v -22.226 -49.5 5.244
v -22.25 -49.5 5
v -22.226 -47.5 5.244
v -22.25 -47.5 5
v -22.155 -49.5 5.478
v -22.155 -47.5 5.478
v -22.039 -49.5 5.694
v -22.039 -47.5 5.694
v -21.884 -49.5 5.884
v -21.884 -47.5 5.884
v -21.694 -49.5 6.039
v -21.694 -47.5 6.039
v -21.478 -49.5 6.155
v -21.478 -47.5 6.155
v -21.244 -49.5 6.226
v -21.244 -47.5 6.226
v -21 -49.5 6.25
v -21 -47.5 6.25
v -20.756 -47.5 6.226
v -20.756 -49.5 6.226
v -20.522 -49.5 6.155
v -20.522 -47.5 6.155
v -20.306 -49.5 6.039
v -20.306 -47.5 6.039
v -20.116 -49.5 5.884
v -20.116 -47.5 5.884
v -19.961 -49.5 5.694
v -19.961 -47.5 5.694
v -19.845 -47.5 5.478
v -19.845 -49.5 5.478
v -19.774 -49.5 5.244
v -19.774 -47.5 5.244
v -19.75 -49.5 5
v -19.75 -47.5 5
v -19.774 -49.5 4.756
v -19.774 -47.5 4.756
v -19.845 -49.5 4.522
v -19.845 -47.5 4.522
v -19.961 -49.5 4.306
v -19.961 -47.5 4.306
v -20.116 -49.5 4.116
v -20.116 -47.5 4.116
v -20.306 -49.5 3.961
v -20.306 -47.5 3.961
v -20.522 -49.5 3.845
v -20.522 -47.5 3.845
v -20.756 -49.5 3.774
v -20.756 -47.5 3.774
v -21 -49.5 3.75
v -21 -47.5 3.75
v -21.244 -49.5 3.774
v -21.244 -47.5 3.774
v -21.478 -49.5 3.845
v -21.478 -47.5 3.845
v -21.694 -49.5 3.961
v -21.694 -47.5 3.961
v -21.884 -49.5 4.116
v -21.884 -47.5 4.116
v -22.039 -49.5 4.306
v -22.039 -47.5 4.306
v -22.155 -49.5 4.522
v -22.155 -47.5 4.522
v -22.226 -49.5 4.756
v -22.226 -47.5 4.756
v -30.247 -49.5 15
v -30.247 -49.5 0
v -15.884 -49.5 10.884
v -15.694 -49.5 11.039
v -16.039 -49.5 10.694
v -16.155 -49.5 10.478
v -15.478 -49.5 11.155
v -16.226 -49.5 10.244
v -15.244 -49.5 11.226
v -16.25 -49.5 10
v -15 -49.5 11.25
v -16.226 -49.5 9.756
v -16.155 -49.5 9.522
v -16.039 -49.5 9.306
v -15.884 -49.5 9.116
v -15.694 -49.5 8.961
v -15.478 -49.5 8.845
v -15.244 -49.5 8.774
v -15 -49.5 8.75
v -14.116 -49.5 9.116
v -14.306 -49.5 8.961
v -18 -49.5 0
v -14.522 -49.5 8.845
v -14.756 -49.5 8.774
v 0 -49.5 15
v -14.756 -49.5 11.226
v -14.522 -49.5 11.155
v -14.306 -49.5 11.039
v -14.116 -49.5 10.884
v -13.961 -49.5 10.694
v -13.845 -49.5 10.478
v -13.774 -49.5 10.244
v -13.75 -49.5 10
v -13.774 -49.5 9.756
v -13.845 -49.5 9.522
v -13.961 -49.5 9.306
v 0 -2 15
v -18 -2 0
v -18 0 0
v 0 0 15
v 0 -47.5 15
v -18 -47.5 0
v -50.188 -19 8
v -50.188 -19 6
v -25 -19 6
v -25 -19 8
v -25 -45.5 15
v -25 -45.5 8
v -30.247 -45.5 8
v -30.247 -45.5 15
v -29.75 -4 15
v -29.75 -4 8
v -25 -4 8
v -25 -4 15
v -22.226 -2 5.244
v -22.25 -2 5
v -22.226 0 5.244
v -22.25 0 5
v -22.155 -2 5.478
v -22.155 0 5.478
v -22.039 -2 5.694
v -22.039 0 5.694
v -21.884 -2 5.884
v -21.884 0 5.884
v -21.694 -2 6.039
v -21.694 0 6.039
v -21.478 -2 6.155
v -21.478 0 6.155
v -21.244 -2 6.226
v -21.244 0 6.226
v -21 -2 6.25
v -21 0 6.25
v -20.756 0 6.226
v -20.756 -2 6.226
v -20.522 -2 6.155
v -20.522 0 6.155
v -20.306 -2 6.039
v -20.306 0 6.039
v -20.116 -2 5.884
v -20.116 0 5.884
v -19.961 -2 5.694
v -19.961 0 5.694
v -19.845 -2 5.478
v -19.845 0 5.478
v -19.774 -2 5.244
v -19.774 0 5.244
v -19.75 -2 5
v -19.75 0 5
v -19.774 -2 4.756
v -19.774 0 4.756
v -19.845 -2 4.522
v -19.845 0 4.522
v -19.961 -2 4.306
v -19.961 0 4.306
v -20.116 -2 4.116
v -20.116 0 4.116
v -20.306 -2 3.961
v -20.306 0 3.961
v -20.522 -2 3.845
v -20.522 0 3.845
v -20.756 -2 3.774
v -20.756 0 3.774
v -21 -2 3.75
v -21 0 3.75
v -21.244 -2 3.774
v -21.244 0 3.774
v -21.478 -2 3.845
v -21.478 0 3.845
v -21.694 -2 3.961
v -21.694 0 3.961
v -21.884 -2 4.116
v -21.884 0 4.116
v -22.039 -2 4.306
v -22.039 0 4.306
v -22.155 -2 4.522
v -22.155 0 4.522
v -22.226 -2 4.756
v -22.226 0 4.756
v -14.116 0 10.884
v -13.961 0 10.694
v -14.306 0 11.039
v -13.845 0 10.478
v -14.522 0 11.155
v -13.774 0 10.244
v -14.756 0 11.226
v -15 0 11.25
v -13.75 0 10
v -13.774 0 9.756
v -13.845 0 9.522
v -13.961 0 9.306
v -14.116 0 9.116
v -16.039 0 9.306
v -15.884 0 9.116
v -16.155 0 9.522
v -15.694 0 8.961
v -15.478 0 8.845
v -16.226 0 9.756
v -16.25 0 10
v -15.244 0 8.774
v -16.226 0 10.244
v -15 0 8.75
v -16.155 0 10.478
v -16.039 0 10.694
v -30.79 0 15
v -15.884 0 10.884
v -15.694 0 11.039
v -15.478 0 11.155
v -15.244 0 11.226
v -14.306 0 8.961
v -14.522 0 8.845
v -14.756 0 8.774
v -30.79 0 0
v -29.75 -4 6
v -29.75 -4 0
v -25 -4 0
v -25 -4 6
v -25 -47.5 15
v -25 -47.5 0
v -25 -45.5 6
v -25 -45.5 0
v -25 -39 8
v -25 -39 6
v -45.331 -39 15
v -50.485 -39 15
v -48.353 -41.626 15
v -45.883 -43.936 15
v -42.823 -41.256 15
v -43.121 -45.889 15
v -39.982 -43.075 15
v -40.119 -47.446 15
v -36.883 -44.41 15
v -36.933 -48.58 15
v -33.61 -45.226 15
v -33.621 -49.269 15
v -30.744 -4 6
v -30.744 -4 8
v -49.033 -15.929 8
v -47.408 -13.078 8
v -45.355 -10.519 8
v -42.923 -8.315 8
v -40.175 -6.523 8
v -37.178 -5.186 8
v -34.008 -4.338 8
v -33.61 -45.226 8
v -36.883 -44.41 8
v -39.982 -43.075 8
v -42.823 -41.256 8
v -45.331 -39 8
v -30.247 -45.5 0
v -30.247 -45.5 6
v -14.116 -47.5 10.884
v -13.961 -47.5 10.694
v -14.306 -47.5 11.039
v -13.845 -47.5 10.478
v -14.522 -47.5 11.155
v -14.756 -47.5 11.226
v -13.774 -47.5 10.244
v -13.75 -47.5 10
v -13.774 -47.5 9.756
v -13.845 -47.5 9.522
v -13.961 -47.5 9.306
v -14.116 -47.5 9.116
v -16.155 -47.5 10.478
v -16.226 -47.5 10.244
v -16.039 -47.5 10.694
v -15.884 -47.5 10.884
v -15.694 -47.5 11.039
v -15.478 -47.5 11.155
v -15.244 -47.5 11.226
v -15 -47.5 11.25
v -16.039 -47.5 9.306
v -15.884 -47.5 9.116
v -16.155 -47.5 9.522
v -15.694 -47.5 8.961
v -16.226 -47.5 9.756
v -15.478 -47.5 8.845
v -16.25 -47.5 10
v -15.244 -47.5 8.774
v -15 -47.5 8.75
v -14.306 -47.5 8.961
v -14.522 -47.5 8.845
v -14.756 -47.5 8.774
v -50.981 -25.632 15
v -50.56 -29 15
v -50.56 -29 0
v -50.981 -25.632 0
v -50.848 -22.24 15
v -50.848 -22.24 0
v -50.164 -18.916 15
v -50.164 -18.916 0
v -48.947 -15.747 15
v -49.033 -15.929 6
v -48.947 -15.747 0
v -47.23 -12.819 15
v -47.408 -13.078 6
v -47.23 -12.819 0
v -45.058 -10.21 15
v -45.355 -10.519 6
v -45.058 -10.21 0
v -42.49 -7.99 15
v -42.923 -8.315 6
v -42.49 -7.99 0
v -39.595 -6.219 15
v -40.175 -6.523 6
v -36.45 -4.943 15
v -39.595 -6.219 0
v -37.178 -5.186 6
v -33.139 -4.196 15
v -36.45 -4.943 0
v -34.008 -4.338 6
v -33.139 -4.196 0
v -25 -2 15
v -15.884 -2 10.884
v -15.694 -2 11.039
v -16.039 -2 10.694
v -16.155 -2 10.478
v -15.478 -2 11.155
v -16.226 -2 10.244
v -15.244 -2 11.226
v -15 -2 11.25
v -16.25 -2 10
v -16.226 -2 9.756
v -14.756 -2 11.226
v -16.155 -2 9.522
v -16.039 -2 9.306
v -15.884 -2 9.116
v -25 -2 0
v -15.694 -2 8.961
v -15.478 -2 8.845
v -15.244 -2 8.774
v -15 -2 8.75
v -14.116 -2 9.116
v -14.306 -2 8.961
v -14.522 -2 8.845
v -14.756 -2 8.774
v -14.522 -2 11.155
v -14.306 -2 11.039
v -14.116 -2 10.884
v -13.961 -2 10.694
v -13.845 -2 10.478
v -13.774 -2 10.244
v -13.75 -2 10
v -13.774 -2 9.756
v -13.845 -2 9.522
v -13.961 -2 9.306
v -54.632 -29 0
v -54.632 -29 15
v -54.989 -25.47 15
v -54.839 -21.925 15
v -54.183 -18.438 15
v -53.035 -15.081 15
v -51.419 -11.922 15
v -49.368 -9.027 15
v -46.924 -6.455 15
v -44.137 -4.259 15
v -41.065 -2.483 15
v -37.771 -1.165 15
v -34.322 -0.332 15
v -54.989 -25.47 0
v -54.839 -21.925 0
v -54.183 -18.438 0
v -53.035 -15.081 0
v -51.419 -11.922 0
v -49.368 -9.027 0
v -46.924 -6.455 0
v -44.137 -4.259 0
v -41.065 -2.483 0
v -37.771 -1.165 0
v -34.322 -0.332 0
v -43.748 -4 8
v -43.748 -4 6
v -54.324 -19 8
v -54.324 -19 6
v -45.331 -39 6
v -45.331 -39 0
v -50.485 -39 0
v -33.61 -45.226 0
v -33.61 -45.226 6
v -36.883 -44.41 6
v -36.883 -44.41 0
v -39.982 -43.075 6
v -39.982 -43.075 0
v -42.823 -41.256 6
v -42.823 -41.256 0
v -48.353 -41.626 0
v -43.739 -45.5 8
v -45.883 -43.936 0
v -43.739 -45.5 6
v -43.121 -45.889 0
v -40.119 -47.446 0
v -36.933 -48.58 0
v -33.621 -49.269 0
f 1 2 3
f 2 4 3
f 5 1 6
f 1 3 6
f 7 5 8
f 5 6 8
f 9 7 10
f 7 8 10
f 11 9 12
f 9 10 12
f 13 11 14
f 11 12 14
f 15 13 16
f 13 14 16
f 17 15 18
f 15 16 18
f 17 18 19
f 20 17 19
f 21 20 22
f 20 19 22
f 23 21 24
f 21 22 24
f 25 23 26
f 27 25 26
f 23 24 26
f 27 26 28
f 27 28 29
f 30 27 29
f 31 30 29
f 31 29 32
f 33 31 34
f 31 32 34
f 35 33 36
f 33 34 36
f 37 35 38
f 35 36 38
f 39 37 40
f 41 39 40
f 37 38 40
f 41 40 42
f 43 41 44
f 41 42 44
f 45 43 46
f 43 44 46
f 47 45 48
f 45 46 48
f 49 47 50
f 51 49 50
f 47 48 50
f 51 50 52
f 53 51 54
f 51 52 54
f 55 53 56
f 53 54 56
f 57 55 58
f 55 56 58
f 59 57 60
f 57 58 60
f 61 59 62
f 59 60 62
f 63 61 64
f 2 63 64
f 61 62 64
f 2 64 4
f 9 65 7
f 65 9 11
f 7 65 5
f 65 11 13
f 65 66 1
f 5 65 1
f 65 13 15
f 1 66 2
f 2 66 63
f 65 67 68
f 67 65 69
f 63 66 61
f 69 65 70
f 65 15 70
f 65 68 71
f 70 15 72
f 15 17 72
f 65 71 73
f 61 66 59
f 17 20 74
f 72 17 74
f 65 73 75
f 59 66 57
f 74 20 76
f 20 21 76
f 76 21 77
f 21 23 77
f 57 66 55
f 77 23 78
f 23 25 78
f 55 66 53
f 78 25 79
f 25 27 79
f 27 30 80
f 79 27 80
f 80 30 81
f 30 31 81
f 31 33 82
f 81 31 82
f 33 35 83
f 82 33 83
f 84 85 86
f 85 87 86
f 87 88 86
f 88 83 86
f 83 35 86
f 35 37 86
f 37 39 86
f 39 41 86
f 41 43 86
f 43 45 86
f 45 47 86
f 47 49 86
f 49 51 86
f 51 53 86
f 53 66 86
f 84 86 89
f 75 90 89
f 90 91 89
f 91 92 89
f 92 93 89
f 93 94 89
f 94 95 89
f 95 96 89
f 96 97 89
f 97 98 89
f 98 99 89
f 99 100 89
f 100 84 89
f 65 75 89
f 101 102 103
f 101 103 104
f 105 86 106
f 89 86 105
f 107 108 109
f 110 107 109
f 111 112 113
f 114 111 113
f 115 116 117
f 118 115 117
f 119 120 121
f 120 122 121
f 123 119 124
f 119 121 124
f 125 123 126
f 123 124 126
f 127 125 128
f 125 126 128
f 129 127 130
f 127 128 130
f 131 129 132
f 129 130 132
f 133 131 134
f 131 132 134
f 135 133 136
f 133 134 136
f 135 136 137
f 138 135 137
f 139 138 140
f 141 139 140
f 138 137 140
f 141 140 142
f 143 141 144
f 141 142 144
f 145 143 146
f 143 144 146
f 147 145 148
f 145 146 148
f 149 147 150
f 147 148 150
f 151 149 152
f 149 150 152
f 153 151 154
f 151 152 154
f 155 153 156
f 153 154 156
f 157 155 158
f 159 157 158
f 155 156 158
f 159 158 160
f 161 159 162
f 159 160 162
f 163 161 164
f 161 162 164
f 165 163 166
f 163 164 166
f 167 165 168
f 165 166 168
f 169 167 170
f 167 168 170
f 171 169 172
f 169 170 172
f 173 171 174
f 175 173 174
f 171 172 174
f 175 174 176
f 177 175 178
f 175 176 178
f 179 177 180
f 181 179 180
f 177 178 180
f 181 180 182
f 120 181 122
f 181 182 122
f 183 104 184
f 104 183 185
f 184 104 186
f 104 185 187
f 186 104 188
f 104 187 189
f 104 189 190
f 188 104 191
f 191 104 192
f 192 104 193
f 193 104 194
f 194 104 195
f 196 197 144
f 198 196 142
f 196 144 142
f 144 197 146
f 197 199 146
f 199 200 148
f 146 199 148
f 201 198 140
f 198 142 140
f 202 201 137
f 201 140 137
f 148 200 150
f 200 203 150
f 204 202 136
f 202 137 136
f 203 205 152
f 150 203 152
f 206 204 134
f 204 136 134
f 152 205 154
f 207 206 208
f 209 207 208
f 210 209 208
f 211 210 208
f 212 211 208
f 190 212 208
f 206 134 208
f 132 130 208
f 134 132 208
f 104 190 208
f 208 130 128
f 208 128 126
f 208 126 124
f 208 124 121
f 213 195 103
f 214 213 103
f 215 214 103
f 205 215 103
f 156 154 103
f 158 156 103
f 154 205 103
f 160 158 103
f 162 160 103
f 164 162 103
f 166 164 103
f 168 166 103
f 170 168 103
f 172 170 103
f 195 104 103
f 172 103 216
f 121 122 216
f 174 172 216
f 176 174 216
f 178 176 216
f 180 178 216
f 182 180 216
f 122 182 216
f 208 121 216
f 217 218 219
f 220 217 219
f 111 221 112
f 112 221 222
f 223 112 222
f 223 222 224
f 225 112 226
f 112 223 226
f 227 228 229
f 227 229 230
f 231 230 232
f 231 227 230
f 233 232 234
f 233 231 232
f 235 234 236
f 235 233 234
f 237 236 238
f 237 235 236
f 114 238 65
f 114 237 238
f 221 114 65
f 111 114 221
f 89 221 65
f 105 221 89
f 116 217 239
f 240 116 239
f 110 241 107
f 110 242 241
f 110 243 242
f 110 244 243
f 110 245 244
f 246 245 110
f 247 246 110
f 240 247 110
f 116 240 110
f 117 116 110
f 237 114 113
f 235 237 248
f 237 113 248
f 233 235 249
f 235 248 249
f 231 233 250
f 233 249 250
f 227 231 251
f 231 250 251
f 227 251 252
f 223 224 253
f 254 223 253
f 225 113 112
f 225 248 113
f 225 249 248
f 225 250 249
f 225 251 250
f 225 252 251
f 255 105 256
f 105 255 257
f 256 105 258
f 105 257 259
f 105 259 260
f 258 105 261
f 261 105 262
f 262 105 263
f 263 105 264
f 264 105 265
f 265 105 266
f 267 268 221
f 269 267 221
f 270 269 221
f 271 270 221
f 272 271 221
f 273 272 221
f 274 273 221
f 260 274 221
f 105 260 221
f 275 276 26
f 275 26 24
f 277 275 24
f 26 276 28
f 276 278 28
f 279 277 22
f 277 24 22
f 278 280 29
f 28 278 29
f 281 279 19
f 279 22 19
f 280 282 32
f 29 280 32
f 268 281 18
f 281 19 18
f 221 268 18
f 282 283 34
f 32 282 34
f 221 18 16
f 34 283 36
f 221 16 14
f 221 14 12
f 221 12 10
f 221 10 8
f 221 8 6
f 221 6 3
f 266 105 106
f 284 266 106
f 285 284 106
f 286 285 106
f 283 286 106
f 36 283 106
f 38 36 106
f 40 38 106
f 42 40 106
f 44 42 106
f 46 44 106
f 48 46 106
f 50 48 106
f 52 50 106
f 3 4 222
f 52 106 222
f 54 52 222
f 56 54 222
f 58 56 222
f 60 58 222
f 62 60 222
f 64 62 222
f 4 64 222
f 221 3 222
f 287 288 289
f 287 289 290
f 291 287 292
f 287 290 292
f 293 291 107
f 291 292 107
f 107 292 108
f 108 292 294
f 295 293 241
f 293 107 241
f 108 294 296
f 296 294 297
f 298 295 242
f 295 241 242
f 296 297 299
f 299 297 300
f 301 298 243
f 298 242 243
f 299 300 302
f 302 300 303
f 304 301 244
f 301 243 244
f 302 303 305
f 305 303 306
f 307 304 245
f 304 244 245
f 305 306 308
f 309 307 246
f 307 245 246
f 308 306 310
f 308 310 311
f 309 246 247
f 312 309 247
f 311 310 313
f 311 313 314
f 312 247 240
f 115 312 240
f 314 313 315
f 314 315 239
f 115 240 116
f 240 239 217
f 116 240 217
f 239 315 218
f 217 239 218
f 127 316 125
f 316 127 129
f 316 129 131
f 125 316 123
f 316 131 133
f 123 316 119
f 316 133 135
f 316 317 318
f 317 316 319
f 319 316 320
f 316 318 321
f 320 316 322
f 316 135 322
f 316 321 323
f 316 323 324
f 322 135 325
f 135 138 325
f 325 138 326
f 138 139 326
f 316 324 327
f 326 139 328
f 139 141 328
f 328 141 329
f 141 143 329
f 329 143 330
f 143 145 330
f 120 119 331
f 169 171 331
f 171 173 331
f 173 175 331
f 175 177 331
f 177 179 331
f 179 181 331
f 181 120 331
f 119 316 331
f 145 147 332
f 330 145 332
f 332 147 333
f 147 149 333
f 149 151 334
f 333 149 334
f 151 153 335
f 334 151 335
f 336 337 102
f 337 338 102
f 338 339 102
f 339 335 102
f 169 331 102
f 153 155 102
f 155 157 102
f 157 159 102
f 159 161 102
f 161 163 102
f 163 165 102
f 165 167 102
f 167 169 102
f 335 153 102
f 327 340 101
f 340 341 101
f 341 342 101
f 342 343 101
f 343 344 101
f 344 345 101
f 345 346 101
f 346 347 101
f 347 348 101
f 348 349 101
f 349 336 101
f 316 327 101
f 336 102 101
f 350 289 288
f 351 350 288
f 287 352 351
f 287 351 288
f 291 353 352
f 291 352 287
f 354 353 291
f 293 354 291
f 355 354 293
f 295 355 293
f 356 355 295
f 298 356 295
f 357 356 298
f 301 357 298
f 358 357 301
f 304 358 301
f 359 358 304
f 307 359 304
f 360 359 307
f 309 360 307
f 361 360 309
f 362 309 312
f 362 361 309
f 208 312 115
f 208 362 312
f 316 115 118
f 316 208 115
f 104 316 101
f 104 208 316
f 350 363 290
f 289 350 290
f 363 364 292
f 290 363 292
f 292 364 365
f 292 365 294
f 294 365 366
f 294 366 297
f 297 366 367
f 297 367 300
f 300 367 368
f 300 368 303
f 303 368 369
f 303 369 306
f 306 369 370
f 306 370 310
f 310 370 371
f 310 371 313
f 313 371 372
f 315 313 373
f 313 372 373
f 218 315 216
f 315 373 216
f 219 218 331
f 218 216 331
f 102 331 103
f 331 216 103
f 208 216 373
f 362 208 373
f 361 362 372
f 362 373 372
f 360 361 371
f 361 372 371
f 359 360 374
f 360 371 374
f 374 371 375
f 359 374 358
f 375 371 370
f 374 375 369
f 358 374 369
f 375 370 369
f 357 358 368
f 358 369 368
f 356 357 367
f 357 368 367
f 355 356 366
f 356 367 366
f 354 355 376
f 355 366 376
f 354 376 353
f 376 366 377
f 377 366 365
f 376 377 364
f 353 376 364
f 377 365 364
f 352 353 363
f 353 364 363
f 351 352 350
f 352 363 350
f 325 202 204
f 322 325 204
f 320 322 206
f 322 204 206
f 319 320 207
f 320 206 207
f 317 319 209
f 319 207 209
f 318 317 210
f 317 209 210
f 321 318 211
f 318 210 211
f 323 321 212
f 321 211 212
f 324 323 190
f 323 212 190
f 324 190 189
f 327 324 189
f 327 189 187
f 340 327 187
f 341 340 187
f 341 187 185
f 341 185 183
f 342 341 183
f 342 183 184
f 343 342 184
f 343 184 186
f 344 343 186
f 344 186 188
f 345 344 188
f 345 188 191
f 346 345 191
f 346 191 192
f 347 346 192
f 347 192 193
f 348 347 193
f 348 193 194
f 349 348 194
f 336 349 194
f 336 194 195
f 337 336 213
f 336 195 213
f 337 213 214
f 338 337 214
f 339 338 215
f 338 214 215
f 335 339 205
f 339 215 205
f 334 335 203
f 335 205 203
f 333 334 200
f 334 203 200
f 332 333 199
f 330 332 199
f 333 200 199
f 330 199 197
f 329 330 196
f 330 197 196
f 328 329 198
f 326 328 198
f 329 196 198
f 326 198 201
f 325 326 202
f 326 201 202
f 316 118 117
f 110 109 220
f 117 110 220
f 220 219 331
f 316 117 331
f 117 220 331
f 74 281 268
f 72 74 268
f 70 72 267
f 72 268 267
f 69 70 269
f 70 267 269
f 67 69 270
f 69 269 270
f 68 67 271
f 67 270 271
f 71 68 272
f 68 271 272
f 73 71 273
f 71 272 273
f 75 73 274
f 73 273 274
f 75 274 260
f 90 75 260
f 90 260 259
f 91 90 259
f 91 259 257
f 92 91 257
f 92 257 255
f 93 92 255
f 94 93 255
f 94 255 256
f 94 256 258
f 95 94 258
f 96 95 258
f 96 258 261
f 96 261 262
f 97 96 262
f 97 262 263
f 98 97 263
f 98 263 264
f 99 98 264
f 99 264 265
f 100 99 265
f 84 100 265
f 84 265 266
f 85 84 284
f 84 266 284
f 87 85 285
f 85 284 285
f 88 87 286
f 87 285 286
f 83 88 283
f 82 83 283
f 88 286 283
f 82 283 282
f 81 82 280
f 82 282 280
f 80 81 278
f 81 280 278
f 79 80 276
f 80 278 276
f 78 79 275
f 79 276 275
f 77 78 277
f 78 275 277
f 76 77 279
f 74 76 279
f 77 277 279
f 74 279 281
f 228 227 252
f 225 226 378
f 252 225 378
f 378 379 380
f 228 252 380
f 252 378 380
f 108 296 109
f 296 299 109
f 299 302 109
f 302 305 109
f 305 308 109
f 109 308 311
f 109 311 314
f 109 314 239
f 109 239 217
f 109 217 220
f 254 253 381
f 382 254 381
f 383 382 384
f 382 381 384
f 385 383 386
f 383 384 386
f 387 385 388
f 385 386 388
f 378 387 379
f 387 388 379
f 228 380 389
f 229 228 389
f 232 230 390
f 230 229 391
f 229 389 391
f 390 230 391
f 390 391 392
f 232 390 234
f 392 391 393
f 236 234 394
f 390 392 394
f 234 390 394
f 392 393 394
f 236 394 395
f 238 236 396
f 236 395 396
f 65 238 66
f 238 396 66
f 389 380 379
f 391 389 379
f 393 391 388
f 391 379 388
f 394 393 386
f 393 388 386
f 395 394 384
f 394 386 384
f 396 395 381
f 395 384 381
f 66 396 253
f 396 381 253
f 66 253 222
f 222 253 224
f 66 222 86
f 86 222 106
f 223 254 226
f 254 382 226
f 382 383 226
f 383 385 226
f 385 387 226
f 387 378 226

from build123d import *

# Parameters (mm, degrees)
F1_DEPTH = 15
F4_DEPTH = 2
F5_R     = 1.25
F6_DEPTH = 300
F7_W     = 10
F7_H     = 15
F8_DEPTH = 55.001


with BuildPart() as f1:
    # F0 (on Top) → F1 (new body)
    with BuildSketch(Plane.XY):
        with BuildLine():
            Line((0, -2), (0, 0))
            Line((0, 0), (-30.789843, 0))
            ThreePointArc((-30.789843, 0), (-54.998512, -25.01845), (-30.247024, -49.5))
            Line((-30.247024, -49.5), (0, -49.5))
            Line((0, -49.5), (0, -47.5))
            Line((0, -47.5), (-25, -47.5))
            Line((-25, -47.5), (-25, -45.5))
            Line((-25, -45.5), (-30.247024, -45.5))
            ThreePointArc((-30.247024, -45.5), (-50.998512, -24.498494), (-29.75, -4))
            Line((-29.75, -4), (-25, -4))
            Line((-25, -4), (-25, -2))
            Line((-25, -2), (0, -2))
        make_face()
    extrude(amount=F1_DEPTH)

    # F3 (on offset) → F4 (join)
    with BuildSketch(Plane.XY.offset(6)):
        Polygon((-25, -45.5), (-25, -39), (-50.484674, -39), (-43.738644, -45.5), align=None)
        Polygon((-25, -19), (-25, -4), (-43.747796, -4), (-54.323601, -19), align=None)
    extrude(amount=F4_DEPTH)

    # F5 (on face) → F6 (cut, symmetric)
    with BuildSketch(Plane(origin=(0, 0, 0), x_dir=(-1, 0, 0), z_dir=(0, 1, 0))):
        Polygon((0, 0), (17.999726, 0), (0, 15), align=None)
        with Locations((15, 10)):
            Circle(F5_R)
        with Locations((21, 5)):
            Circle(F5_R)
    extrude(amount=F6_DEPTH, both=True, mode=Mode.SUBTRACT)

    # F7 (on Right) → F8 (cut, through all)
    with BuildSketch(Plane.YZ):
        with Locations((-34, 7.5)):
            Rectangle(F7_W, F7_H)
    extrude(amount=-F8_DEPTH, mode=Mode.SUBTRACT)


solid = f1.part
